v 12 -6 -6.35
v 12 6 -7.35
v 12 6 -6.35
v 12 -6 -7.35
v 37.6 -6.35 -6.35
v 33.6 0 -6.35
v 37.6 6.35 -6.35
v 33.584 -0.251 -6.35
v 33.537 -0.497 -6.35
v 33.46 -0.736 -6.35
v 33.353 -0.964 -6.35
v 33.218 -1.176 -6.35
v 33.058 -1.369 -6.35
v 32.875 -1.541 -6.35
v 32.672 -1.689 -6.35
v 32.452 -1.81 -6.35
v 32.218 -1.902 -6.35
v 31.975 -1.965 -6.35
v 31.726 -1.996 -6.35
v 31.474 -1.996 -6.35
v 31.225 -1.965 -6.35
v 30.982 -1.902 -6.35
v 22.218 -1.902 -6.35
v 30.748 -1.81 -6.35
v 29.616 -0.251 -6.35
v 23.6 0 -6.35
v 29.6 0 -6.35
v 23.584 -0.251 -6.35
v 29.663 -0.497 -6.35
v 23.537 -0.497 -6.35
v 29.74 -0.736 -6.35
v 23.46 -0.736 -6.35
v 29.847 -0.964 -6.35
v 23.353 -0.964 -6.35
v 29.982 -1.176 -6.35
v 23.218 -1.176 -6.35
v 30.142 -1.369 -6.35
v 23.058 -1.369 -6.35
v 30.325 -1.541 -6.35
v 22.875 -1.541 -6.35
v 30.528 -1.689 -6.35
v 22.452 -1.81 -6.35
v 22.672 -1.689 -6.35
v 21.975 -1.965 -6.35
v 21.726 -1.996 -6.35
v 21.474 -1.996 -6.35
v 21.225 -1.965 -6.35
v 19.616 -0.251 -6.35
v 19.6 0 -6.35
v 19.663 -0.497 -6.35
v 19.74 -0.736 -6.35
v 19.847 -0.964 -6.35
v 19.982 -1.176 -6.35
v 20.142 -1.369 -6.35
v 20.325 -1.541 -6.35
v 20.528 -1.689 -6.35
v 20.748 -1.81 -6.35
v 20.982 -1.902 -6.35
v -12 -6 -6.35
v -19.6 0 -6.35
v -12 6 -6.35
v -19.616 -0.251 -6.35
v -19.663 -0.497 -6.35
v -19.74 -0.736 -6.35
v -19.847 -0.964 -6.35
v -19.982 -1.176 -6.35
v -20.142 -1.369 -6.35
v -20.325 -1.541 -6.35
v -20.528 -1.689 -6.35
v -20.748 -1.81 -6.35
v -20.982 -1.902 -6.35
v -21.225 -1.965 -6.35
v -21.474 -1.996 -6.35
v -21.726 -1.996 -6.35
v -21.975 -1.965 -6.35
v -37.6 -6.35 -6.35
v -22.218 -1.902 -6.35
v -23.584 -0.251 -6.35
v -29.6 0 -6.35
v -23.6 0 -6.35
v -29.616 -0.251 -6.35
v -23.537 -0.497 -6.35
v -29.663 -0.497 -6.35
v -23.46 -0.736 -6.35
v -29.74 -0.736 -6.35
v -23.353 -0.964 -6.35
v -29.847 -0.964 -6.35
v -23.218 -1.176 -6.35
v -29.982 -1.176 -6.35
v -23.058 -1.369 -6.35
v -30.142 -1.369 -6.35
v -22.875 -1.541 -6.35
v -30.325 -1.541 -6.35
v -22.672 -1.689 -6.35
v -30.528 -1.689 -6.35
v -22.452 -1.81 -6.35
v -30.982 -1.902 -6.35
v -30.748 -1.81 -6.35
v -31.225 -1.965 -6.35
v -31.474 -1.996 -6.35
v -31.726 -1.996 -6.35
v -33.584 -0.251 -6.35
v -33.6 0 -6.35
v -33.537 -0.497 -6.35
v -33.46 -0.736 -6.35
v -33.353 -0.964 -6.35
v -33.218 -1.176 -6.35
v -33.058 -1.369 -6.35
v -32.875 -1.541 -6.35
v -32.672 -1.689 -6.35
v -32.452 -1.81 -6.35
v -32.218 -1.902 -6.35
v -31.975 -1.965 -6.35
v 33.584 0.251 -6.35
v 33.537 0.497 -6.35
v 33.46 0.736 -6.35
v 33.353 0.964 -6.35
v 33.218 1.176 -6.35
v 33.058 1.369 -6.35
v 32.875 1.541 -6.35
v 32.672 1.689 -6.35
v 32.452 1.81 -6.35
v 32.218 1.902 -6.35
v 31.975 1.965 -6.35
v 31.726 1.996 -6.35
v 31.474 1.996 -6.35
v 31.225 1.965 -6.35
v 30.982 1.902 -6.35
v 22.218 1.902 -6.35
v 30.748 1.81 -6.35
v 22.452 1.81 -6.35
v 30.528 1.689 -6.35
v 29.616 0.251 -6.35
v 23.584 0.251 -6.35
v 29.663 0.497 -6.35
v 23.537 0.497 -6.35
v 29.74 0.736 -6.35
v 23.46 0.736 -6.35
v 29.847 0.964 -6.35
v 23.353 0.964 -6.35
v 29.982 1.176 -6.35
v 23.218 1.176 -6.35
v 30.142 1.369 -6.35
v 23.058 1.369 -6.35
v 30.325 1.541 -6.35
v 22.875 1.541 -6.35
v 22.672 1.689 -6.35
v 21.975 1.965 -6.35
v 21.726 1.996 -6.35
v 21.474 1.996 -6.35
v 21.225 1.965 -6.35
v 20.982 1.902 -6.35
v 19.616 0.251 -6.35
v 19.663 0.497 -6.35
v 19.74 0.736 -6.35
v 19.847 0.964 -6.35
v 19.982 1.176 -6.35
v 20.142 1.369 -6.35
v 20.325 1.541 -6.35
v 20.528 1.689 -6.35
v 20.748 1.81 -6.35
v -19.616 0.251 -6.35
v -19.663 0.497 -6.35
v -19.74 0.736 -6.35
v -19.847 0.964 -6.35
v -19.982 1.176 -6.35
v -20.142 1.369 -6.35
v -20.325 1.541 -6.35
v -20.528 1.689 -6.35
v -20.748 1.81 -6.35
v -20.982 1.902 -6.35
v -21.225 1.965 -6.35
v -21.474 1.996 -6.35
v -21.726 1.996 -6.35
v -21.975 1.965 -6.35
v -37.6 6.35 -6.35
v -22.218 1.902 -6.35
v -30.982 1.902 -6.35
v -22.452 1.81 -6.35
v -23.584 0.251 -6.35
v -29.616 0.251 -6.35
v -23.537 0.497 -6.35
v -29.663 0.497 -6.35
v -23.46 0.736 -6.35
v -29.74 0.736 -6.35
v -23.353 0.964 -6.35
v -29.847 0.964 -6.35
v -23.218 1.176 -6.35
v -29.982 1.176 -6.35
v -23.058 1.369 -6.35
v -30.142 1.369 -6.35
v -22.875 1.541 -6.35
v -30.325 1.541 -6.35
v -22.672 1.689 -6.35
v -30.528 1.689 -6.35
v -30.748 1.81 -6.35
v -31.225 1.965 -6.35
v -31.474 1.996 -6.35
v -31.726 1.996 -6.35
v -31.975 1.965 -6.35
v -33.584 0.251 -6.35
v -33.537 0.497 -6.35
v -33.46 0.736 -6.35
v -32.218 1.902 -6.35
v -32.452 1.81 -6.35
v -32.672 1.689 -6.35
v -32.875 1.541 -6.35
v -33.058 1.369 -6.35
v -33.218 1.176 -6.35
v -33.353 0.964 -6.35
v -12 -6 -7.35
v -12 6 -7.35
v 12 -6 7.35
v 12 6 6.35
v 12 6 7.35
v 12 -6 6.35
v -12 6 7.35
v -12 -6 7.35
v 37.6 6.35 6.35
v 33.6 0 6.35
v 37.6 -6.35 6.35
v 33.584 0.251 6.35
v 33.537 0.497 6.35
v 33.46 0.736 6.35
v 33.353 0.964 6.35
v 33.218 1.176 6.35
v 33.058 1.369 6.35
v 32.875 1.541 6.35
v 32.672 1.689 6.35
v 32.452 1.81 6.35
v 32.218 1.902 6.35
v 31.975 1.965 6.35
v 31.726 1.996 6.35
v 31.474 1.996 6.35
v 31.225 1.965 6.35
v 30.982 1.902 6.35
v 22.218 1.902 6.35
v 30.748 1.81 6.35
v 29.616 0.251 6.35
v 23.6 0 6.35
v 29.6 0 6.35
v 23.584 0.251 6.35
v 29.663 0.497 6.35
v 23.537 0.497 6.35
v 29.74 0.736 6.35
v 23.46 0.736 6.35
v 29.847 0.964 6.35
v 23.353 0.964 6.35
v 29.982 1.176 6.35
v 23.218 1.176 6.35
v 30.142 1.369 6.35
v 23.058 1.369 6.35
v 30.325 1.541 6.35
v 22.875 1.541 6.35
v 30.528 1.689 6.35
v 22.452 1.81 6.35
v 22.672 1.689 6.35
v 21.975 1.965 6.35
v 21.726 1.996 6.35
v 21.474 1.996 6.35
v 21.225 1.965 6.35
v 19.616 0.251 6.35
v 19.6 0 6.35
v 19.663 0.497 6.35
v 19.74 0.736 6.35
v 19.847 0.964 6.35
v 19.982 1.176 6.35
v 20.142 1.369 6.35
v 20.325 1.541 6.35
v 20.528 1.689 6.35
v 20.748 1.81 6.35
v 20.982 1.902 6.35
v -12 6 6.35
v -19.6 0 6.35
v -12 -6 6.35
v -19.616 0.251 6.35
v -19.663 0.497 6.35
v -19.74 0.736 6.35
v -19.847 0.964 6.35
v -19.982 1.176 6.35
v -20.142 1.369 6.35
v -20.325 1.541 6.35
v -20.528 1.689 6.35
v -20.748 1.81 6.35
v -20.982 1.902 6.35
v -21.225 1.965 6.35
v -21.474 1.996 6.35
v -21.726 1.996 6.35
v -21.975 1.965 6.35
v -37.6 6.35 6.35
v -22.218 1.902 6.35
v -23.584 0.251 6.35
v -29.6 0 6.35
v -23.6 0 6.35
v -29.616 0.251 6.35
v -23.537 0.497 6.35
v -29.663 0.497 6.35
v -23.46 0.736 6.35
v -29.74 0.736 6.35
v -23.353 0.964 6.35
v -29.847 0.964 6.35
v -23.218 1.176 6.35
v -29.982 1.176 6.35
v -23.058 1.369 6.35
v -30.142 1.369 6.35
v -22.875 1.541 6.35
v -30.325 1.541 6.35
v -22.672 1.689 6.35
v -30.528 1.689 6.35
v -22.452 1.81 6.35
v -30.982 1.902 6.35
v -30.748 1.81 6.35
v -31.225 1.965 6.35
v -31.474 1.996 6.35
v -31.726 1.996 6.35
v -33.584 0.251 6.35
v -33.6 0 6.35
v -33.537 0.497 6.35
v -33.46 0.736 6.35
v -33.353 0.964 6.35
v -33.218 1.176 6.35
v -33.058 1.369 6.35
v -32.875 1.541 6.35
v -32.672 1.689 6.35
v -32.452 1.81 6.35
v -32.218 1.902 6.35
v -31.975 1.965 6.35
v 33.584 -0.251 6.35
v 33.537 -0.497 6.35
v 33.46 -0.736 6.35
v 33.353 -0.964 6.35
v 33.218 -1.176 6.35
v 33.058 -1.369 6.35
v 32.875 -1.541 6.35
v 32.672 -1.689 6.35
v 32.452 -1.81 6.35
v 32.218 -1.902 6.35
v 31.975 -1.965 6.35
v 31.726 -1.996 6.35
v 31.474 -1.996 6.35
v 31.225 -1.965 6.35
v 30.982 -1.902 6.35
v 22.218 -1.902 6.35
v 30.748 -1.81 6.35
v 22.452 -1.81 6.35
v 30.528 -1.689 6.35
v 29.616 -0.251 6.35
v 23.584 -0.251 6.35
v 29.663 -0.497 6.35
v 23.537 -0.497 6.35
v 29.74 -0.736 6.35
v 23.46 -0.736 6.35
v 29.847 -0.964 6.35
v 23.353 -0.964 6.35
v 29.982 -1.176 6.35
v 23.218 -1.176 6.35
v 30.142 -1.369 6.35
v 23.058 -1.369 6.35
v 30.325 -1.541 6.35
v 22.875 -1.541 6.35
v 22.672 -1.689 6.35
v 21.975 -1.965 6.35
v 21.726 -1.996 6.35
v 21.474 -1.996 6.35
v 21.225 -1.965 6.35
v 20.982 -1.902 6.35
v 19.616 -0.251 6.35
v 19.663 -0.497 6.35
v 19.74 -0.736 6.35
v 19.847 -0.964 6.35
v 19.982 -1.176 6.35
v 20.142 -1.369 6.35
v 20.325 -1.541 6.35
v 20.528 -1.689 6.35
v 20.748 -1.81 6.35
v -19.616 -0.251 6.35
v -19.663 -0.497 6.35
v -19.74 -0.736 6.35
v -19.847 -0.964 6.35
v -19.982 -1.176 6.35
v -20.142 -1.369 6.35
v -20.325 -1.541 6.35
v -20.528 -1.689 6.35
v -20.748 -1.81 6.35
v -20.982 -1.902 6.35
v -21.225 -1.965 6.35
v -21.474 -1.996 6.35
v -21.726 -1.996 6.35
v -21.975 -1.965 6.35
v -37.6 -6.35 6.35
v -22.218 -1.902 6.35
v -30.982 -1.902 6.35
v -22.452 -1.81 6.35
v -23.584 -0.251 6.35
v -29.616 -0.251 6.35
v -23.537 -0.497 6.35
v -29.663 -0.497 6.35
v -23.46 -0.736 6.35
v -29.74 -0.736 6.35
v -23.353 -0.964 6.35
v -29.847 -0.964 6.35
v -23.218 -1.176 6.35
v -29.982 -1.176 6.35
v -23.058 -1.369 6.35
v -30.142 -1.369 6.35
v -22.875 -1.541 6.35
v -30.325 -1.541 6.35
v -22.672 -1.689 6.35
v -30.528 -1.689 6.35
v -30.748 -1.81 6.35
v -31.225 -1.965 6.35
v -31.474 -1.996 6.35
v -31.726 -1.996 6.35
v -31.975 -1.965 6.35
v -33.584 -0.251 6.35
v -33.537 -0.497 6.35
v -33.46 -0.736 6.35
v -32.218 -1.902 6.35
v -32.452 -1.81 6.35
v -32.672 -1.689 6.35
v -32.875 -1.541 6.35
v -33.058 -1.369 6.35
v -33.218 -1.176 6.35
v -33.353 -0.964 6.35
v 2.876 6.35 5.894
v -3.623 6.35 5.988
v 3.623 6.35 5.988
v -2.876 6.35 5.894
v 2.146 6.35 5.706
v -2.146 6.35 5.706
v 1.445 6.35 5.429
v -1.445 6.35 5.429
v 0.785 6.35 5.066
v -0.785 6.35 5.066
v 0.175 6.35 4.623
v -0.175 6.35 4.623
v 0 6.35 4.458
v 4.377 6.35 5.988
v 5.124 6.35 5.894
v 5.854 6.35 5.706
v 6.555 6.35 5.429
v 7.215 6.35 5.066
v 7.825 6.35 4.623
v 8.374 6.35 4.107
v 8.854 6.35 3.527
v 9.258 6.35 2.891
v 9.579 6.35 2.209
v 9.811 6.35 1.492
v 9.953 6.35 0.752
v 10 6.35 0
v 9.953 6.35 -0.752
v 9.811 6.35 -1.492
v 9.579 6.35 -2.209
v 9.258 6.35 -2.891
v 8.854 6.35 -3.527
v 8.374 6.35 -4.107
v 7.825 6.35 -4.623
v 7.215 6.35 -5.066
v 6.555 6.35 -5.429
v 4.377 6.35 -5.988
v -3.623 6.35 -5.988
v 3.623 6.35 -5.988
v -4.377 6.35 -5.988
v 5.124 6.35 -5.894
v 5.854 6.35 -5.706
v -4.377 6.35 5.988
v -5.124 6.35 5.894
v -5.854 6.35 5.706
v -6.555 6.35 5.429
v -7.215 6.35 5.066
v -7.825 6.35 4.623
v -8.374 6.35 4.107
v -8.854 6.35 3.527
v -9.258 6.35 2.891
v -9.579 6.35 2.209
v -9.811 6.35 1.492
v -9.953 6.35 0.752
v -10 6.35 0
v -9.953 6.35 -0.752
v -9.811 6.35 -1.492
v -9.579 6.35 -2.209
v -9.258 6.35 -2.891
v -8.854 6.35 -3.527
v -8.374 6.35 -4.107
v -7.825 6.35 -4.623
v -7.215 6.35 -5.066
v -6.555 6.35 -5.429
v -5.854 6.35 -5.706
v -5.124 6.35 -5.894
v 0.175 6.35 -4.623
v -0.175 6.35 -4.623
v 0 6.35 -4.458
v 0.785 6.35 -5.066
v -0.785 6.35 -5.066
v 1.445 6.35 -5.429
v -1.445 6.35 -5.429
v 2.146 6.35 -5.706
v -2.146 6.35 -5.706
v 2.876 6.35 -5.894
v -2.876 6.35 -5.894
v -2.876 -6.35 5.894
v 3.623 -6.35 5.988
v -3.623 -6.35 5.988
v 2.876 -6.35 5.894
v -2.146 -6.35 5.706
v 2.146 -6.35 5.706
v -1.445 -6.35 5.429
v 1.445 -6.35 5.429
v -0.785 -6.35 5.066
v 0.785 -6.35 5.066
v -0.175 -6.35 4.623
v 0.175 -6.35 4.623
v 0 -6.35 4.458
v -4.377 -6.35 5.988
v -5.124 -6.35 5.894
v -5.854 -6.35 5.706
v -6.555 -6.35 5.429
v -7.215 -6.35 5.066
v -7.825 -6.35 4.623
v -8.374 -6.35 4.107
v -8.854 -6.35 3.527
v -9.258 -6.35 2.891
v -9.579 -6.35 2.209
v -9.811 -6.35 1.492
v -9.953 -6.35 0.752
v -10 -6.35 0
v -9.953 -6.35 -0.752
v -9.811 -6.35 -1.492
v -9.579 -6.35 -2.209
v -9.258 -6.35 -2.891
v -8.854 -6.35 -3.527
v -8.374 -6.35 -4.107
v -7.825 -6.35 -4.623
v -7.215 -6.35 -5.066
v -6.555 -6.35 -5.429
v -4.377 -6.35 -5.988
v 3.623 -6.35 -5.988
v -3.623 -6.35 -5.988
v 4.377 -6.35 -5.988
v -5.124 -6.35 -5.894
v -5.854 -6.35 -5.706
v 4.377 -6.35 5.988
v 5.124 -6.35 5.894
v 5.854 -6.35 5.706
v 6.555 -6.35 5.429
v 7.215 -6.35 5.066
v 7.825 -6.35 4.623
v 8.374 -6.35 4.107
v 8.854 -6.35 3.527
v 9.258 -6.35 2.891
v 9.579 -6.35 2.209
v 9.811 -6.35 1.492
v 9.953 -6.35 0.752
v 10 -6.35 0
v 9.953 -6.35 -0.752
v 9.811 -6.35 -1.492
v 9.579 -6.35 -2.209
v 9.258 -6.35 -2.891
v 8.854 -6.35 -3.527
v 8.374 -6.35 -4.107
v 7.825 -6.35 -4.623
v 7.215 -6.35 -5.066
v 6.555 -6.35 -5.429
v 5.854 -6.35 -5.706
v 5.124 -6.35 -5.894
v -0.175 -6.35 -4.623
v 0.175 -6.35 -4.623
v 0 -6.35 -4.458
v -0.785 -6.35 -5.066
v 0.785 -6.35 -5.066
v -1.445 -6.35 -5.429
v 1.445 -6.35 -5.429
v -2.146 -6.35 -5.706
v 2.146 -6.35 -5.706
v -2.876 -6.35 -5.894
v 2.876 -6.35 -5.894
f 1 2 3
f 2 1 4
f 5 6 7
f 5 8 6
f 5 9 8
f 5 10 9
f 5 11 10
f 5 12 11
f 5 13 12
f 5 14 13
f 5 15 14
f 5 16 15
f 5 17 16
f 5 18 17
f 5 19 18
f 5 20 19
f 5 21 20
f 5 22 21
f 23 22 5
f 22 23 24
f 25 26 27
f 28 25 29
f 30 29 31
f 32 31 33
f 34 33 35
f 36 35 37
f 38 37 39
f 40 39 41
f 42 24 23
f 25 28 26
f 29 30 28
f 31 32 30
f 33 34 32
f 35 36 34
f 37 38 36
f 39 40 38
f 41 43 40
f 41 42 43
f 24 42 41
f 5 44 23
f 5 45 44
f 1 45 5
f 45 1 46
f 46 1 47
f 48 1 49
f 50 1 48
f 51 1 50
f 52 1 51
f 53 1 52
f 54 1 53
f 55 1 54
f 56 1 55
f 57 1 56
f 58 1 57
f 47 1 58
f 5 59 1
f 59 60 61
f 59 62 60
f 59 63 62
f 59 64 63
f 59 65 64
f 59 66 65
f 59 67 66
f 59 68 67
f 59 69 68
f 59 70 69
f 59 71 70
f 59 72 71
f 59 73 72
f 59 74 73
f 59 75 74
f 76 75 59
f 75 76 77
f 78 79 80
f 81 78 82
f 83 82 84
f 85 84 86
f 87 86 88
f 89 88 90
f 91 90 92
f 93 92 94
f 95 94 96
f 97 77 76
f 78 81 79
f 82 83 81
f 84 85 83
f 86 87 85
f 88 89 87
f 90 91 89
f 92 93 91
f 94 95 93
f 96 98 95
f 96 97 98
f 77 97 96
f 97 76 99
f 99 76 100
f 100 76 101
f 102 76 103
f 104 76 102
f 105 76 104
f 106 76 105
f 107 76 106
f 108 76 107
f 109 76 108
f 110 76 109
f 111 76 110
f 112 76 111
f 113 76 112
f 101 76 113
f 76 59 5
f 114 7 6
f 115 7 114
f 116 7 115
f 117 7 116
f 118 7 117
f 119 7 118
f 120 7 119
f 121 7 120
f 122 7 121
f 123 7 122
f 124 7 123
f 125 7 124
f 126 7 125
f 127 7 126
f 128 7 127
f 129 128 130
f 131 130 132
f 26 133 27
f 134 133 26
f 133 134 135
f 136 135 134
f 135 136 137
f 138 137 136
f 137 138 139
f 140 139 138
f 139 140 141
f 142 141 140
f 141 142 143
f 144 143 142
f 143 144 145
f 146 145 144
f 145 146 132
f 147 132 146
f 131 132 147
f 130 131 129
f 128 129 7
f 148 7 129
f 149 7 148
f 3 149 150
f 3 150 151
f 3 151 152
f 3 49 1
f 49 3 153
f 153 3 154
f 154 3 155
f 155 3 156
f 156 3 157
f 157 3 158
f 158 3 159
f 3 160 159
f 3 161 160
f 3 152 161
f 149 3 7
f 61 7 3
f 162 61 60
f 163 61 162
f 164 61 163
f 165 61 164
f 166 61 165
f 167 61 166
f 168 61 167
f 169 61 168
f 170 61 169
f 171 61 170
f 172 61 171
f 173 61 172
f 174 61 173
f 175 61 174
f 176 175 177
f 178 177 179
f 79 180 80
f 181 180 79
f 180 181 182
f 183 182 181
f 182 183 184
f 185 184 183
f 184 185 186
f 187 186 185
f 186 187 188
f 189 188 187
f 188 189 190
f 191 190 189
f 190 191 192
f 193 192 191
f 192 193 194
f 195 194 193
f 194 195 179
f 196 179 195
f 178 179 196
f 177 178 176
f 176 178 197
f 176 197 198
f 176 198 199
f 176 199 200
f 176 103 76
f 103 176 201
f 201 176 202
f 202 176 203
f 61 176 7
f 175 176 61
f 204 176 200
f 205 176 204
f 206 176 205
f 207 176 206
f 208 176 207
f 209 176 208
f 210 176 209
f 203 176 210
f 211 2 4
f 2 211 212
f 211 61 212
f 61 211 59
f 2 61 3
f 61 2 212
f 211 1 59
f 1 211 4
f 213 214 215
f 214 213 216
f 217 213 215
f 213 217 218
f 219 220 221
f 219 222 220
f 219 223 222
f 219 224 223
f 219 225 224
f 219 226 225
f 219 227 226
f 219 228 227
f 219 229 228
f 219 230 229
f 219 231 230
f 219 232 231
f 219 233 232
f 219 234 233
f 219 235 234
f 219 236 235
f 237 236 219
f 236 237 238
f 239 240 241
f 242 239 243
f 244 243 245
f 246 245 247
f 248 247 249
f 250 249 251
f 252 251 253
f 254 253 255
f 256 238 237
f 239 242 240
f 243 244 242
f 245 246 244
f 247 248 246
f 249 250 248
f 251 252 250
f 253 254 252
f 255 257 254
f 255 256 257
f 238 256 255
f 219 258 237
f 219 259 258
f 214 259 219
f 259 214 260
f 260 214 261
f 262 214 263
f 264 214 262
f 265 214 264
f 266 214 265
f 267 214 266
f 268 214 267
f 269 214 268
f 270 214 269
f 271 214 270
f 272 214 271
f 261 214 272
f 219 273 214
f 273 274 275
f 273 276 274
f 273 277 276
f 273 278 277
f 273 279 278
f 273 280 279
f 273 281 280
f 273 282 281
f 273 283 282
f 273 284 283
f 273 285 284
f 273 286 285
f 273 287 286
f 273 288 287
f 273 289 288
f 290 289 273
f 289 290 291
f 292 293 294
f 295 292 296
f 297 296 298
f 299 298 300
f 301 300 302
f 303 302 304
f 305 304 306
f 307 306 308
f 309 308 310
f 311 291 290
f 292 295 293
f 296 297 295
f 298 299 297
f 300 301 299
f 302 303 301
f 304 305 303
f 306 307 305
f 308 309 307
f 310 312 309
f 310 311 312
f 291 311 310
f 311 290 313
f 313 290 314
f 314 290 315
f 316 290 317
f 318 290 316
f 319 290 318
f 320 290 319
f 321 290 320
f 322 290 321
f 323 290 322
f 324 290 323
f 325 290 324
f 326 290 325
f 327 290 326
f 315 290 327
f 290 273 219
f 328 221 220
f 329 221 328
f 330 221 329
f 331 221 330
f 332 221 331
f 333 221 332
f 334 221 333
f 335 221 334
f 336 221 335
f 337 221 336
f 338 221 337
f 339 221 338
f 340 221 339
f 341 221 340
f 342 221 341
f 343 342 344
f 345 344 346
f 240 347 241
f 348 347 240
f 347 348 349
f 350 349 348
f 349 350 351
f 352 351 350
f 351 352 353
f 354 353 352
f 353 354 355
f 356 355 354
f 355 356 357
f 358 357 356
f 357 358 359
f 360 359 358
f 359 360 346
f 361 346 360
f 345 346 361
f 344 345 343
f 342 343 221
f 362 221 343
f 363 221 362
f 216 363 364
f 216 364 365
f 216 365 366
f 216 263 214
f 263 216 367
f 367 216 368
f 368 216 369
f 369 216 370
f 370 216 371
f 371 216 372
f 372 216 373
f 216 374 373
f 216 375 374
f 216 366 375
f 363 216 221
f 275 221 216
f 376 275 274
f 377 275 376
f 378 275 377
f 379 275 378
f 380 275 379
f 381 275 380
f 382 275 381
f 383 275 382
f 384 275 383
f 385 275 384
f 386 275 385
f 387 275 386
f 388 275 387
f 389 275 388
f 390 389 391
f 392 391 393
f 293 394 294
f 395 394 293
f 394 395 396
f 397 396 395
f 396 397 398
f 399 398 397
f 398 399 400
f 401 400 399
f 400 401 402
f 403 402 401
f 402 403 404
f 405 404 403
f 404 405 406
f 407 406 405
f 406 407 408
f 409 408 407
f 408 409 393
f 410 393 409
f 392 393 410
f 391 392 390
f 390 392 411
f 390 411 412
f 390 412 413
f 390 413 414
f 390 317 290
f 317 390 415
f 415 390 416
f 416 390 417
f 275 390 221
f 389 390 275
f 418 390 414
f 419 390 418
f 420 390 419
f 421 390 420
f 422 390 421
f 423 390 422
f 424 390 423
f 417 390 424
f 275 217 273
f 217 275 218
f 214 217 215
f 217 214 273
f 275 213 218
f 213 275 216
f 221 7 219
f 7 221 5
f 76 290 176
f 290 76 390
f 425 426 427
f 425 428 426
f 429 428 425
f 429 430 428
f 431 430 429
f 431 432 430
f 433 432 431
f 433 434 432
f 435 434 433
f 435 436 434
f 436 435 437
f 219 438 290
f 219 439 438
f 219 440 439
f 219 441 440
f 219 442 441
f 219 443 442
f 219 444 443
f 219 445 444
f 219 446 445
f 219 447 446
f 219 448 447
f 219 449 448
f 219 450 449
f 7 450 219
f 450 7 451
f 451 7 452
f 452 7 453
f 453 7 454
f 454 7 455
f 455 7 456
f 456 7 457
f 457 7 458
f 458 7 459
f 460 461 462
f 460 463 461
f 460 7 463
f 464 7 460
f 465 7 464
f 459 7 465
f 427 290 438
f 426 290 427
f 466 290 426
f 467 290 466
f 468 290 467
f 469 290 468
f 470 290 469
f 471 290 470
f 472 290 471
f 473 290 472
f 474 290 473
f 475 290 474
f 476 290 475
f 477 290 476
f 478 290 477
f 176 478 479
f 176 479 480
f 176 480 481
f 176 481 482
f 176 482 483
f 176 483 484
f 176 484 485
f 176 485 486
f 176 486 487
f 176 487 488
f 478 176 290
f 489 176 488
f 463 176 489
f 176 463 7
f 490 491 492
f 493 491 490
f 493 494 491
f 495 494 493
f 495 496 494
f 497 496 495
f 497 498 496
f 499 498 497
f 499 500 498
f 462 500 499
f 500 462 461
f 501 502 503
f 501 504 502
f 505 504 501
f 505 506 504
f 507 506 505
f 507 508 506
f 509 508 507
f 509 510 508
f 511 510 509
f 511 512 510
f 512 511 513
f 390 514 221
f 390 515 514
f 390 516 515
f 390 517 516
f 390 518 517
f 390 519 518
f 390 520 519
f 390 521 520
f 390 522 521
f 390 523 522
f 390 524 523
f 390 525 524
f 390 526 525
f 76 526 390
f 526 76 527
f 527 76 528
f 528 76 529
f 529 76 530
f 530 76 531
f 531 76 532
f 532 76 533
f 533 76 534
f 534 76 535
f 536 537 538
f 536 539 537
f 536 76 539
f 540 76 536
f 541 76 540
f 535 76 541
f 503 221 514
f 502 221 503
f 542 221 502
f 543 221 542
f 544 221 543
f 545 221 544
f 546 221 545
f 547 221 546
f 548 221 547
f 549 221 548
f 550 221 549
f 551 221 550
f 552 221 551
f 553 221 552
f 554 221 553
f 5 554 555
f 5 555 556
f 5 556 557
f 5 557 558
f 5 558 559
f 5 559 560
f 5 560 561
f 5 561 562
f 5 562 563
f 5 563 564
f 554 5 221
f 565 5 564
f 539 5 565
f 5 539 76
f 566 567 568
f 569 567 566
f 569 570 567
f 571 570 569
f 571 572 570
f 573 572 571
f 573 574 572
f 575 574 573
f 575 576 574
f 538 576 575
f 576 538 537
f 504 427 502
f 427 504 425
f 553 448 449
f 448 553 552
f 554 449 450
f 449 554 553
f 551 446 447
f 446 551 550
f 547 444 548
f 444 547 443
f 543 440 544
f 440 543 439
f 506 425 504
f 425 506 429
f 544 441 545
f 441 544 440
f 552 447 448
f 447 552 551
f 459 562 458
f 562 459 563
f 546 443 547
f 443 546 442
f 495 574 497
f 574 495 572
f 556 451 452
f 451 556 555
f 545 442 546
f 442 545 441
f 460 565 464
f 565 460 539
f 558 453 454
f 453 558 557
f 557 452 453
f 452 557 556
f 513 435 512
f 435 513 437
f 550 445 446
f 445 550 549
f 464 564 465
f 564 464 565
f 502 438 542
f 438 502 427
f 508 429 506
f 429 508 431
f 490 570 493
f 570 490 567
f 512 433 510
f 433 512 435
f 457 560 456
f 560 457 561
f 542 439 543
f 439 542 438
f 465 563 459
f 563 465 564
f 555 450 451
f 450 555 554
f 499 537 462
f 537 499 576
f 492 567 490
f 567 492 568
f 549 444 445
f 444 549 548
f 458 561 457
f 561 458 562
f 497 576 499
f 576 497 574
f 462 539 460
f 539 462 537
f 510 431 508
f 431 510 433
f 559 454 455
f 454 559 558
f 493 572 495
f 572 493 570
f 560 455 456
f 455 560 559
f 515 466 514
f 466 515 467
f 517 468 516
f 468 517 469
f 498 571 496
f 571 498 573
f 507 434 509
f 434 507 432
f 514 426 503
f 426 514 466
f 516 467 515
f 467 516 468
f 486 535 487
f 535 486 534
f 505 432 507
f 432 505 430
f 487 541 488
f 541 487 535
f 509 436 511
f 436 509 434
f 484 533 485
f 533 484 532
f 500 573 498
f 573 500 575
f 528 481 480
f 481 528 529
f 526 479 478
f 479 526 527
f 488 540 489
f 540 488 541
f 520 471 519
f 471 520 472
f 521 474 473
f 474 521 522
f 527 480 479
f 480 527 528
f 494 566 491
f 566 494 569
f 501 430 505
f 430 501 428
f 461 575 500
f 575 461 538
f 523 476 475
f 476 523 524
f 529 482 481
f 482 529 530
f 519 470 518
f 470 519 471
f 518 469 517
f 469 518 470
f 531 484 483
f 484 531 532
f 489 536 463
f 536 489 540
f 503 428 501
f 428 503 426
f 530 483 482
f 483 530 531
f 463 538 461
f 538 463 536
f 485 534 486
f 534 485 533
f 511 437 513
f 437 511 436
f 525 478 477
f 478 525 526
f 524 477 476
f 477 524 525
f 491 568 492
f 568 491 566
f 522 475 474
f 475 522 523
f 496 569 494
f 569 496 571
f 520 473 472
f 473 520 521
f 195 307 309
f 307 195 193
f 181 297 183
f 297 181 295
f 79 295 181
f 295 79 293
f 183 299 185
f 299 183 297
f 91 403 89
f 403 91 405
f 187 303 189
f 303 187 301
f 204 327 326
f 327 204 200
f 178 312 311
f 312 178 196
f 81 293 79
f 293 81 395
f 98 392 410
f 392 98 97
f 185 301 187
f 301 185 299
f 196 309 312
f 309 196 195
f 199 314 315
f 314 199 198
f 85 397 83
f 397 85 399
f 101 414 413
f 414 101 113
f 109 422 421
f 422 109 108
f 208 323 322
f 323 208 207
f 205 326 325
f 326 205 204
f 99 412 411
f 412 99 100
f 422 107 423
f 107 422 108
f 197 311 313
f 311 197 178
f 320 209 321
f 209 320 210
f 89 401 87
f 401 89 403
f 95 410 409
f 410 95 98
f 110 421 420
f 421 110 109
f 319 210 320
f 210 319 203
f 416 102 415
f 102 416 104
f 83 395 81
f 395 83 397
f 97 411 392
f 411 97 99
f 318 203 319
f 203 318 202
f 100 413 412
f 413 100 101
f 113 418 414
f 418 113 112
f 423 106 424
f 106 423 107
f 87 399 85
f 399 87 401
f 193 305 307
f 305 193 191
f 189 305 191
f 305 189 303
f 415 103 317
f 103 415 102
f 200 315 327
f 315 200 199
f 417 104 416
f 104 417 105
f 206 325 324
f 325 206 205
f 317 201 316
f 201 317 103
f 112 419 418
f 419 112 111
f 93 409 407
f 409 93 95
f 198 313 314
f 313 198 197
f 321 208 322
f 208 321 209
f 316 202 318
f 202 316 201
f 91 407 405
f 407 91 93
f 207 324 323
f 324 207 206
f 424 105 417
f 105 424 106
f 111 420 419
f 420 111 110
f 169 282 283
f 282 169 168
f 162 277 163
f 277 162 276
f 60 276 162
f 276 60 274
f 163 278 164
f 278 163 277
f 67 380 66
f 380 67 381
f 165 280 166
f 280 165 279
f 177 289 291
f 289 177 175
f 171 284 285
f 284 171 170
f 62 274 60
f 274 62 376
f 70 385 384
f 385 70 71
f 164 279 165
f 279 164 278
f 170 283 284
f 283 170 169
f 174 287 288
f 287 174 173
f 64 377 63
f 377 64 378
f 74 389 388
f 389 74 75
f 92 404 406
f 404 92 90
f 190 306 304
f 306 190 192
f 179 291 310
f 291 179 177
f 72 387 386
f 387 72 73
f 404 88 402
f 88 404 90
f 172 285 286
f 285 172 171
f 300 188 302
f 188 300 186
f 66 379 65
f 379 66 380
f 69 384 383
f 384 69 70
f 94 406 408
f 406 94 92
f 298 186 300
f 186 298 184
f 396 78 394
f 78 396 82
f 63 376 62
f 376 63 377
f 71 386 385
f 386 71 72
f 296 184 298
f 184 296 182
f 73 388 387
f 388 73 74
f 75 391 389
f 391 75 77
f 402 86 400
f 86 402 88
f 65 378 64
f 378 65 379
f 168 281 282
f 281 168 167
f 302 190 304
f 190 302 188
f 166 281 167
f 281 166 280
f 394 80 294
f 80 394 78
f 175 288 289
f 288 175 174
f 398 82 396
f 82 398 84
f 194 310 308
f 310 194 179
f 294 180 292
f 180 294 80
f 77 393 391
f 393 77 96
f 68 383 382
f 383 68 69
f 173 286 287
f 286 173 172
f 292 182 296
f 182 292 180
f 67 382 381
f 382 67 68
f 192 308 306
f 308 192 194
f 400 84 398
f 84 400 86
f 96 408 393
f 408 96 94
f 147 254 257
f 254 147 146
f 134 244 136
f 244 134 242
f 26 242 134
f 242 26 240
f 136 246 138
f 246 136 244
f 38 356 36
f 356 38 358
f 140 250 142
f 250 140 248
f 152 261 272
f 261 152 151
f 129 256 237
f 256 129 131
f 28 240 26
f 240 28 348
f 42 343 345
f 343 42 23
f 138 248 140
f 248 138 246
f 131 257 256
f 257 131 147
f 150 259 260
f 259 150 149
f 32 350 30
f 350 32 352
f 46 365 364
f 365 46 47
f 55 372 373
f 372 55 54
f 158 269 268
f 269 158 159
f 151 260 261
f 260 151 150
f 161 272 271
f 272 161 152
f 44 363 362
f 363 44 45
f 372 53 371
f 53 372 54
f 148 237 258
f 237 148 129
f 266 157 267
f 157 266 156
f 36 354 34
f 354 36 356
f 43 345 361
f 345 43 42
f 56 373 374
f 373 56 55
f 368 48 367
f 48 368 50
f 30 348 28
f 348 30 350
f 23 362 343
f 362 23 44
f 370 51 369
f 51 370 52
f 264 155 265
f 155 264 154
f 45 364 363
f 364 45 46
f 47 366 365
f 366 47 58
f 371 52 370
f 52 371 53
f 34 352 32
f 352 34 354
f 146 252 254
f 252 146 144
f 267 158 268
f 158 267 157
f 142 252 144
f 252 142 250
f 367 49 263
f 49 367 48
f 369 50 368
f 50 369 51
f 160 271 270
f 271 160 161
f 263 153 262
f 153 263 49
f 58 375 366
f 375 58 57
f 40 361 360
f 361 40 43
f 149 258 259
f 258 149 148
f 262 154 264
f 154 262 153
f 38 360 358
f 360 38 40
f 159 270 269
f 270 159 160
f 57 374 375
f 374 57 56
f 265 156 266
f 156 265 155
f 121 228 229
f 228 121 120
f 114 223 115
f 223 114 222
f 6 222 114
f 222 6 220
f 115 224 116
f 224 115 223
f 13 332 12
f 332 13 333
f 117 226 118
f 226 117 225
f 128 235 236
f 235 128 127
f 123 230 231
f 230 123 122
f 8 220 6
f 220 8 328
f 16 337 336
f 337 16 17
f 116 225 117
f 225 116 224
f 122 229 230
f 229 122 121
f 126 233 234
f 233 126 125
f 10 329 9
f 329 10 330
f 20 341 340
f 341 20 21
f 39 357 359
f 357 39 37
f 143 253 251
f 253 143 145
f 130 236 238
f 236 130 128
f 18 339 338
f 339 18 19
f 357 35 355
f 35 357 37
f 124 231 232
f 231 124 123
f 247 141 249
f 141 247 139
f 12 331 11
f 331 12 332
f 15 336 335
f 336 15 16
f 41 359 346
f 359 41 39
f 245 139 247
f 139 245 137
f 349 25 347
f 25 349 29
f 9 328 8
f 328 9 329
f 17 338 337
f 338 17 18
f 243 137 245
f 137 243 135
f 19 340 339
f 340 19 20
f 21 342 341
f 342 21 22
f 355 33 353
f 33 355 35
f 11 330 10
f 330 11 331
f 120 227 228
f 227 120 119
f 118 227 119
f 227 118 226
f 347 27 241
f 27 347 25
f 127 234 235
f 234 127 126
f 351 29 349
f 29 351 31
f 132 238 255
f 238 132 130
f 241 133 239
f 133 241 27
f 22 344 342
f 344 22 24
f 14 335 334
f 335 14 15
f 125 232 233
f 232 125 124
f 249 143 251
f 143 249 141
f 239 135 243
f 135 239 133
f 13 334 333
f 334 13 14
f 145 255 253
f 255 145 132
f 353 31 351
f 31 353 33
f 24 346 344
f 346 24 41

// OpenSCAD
// file: ../amplifier_board.scad
// amplifier_board.scad: draws a load-cell amplifier board (HX711 breakout)
// from a row in amplifier_boards.scad.
//
// The board lies on z = 0, centred on the origin, with its chip in the middle
// and its 0.1 in pin headers in columns along y.
//
// A row is [name, pcb, colour, chip, headers, mount_holes]:
//   pcb          [length, width, thickness]
//   colour       solder mask colour
//   chip         [length, width, height] of the chip
//   headers      header columns, each [x, pins, block height]
//   mount_holes  mounting holes, each [x, y, diameter]

function amp_name(type) = type[0];
function amp_pcb(type) = type[1]; // [length, width, thickness]
function amp_colour(type) = type[2];
function amp_chip(type) = type[3]; // [length, width, height]
function amp_headers(type) = type[4]; // [[x, pins, block height], ...]
function amp_mount_holes(type) = type[5]; // [[x, y, diameter], ...]

pin_pitch = 2.54;
pin_hole_d = 1.0;
pin_d = 0.8;

// y of each pin in a column of n
function amp_pin_ys(n) = [for (i = [0:n - 1]) (i - (n - 1) / 2) * pin_pitch];

module amplifier_board(type, headers = true, header_pin_length = 8) {
    pcb = amp_pcb(type);
    chip = amp_chip(type);
    columns = amp_headers(type);
    t = pcb.z;

    difference() {
        union() {
            color(amp_colour(type)) translate([0, 0, t / 2]) cube(pcb, center=true);
            color("black") translate([0, 0, t + chip.z / 2]) cube(chip, center=true);
            if (headers)
                for (c = columns) color("black") translate([c[0], 0, t + c[2] / 2]) cube([pin_pitch, c[1] * pin_pitch, c[2]], center=true);
        }
        for (c = columns, y = amp_pin_ys(c[1]))
            translate([c[0], y, -0.5]) cylinder(d=pin_hole_d, h=t + c[2] + 1, $fn=20);
        for (m = amp_mount_holes(type))
            translate([m[0], m[1], -0.1]) cylinder(d=m[2], h=t + 0.2, $fn=20);
    }

    if (header_pin_length > 0)
        for (c = columns, y = amp_pin_ys(c[1]))
            translate([c[0], y, -0.2]) cylinder(d=pin_d, h=header_pin_length, $fn=20);
}
// file: ../load_cell.scad
// load_cell.scad: draws a bar load cell from a row in load_cells.scad.
//
// The bar is centred on the origin with its length along x and its mounting
// holes along z. A strain gauge sits on its top and bottom faces over the
// bending section: two bores across the bar (y), joined by a slot when the
// row gives the slot's height.
//
// A row is [name, size, gauge, bores, holes, notches]:
//   size     [length, width, height] of the bar
//   gauge    [length, width, thickness] of each strain gauge
//   bores    [diameter, [x1, y1], [x2, y2]], or with a 4th value, the height
//            of the slot between them
//   holes    groups of mounting holes, each [diameter, [xA, yA], [xB, yB]]
//   notches  [length, depth] of the notches along both sides, or undef

function lc_name(type) = type[0]; // e.g. "TAL220"
function lc_cell_dims(type) = type[1]; // [length, width, height]
function lc_sensor_dims(type) = type[2]; // [length, width, thickness]
function lc_center_cutout(type) = type[3]; // [diameter, [x1, y1], [x2, y2] (, slot height)]
function lc_screw_holes(type) = type[4]; // [[diameter, [xA, yA], [xB, yB]], ...]
function lc_side_cuts(type) = type[5]; // [length, depth], or undef

module load_cell(type, load_cell_color = "silver", sensor_color = "white") {
    size = lc_cell_dims(type);
    gauge = lc_sensor_dims(type);
    bores = lc_center_cutout(type);
    holes = lc_screw_holes(type);
    notches = lc_side_cuts(type);

    difference() {
        union() {
            color(load_cell_color) cube(size, center=true);
            color(sensor_color)for (s = [-1, 1]) translate([0, 0, s * (size.z + gauge.z) / 2]) cube(gauge, center=true);
        }
        // Notches along both sides, rounded at their ends
        if (is_list(notches))
            for (y = [-size.y / 2, size.y / 2])
                hull()for (x = [-1, 1])
                    translate([x * (notches[0] / 2 - 2), y, 0])
                        cylinder(r=notches[1], h=size.z + 1, center=true, $fn=15);
        // The bending section
        for (p = [bores[1], bores[2]])
            translate([p.x, 0, 0]) rotate([90, 0, 0]) cylinder(d=bores[0], h=size.y + 1, center=true, $fn=50);
        if (len(bores) > 3)
            translate([(bores[1].x + bores[2].x) / 2, 0, 0]) cube([abs(bores[1].x - bores[2].x), size.y + 1, bores[3]], center=true);
        // Mounting holes, through the bar
        for (g = holes, p = [g[1], g[2]])
            translate([p.x, p.y, 0]) cylinder(d=g[0], h=size.z + 2, center=true, $fn=50);
    }
}
// file: ../amplifier_boards.scad
// amplifier_boards.scad: load-cell amplifier boards, one row each, for
// amplifier_board().
//
// include this file to get the AMP_* rows and the amplifier_boards list; it
// uses amplifier_board.scad for the accessors and the drawing. The row format
// is at the top of amplifier_board.scad. Sizes in mm.

//                     name              pcb                  colour       chip          headers                                mounting holes
// Generic HX711 breakout: a 6-pin and a 4-pin header, two 3.15 mm holes.
AMP_HX711_generic = ["HX711 generic", [33.5, 20.5, 1.5], "darkgreen", [4.5, 10, 1], [[-13.75, 6, 2], [12.25, 4, 2]], [[12.175, 7.675, 3.15], [12.175, -7.675, 3.15]]];

// SparkFun HX711 breakout: two 5-pin headers, no mounting holes.
AMP_HX711_sparkfun = ["HX711 SparkFun", [31.2, 23.4, 1.6], "darkred", [4.5, 10, 1], [[-14.33, 5, 5.05], [14.33, 5, 5.05]], []];

amplifier_boards = [AMP_HX711_generic, AMP_HX711_sparkfun];

use <amplifier_board.scad>
// file: ../load_cells.scad
// load_cells.scad: bar load cells, one row each, for load_cell().
//
// include this file to get the LC_* rows and the load_cells list; it uses
// load_cell.scad for the accessors and the drawing. The row format is at the
// top of load_cell.scad. Sizes in mm; the bar is centred on the origin.

//                   name              size                  gauge          bores                              mounting holes                                                notches
// komputer.de 10 kg: the TAL220's bar with its own hole positions; M4 both ends.
LC_komputer_10kg = ["komputer_10kg", [75.2, 12.7, 12.7], [24, 12, 1], [12.0, [4, 0], [-4, 0]], [[4, [-31.6, 0], [-21.6, 0]], [4, [21.6, 0], [31.6, 0]]], undef];

// komputer.de 5 kg: M5 at one end, M4 at the other.
LC_komputer_5kg = ["komputer_5kg", [80.2, 12.7, 12.7], [24, 12, 1], [12.0, [4, 0], [-4, 0]], [[5, [-35, 0], [-20, 0]], [4, [20, 0], [35, 0]]], undef];

// TAL220 (10 kg straight bar): M5 at one end, M4 at the other.
LC_TAL220 = ["TAL220", [80, 12.7, 12.7], [24, 12, 1], [12.0, [4, 0], [-4, 0]], [[5, [-35, 0], [-25, 0]], [4, [25, 0], [35, 0]]], undef];

// TAL220B (5 kg straight bar): one M5 hole at each end.
LC_TAL220B = ["TAL220B", [55, 12.7, 12.7], [24, 12, 1], [12.0, [4, 0], [-4, 0]], [[5, [-20, 0], [20, 0]]], undef];

// TAL221 (100 g mini bar): bores joined by a 3 mm slot, notched sides, two
// M3 holes at each end.
LC_TAL221 = ["TAL221", [47, 12, 6], [30, 6, 1], [5.3, [10, 0], [-10, 0], 3], [[3.0, [-20, -3], [-20, 3]], [3.2, [20, -3], [20, 3]]], [33, 2]];

load_cells = [LC_komputer_10kg, LC_komputer_5kg, LC_TAL220, LC_TAL220B, LC_TAL221];

use <load_cell.scad>
// main file
// Checks on one part, chosen by CHECK, for row INDEX of its list:
//   "cell":    load cell INDEX
//   "holes":   load cell INDEX against a pin GROW over each mounting hole,
//              through the bar along z
//   "bores":   load cell INDEX against a pin GROW over each bore, through the
//              bar along y
//   "slot":    load cell INDEX against a block GROW over its bore slot
//   "notches": load cell INDEX against a pin GROW over each side notch's
//              middle, through the bar along z
//   "board":   amplifier board INDEX
//   "pins":    amplifier board INDEX, without its pins, against its pins
//   "mounts":  amplifier board INDEX against a pin GROW over each mounting hole
//   "rows":    nothing; echoes every row
include <../load_cells.scad>
include <../amplifier_boards.scad>

CHECK = "cell";
INDEX = 0;
GROW = 0;

lc = load_cells[INDEX];
amp = amplifier_boards[min(INDEX, len(amplifier_boards) - 1)];

if (CHECK == "cell")
    load_cell(lc);
else if (CHECK == "holes")
    intersection() {
        load_cell(lc);
        for (g = lc_screw_holes(lc), p = [g[1], g[2]])
            translate([p.x, p.y, 0]) cylinder(d=g[0] + GROW, h=100, center=true, $fn=50);
    }
else if (CHECK == "bores")
    intersection() {
        load_cell(lc);
        b = lc_center_cutout(lc);
        for (p = [b[1], b[2]]) translate([p.x, 0, 0]) rotate([90, 0, 0]) cylinder(d=b[0] + GROW, h=100, center=true, $fn=50);
    }
else if (CHECK == "slot")
    intersection() {
        load_cell(lc);
        b = lc_center_cutout(lc);
        translate([(b[1].x + b[2].x) / 2, 0, 0]) cube([abs(b[1].x - b[2].x), 100, b[3] + GROW], center=true);
    }
else if (CHECK == "notches")
    intersection() {
        load_cell(lc);
        n = lc_side_cuts(lc);
        for (y = [-1, 1]) translate([0, y * lc_cell_dims(lc).y / 2, 0]) cylinder(r=n[1] + GROW, h=100, center=true, $fn=50);
    }
else if (CHECK == "board")
    amplifier_board(amp);
else if (CHECK == "pins")
    intersection() {
        amplifier_board(amp, header_pin_length=0);
        for (c = amp_headers(amp), y = amp_pin_ys(c[1])) translate([c[0], y, -0.2]) cylinder(d=0.8, h=8, $fn=20); // pin_d, which use does not export
    }
else if (CHECK == "mounts")
    intersection() {
        amplifier_board(amp, header_pin_length=0);
        for (m = amp_mount_holes(amp)) translate([m[0], m[1], -1]) cylinder(d=m[2] + GROW, h=10, $fn=20);
    }
else if (CHECK == "rows") {
    for (r = load_cells) echo(LC=r);
    for (r = amplifier_boards) echo(AMP=r);
}
